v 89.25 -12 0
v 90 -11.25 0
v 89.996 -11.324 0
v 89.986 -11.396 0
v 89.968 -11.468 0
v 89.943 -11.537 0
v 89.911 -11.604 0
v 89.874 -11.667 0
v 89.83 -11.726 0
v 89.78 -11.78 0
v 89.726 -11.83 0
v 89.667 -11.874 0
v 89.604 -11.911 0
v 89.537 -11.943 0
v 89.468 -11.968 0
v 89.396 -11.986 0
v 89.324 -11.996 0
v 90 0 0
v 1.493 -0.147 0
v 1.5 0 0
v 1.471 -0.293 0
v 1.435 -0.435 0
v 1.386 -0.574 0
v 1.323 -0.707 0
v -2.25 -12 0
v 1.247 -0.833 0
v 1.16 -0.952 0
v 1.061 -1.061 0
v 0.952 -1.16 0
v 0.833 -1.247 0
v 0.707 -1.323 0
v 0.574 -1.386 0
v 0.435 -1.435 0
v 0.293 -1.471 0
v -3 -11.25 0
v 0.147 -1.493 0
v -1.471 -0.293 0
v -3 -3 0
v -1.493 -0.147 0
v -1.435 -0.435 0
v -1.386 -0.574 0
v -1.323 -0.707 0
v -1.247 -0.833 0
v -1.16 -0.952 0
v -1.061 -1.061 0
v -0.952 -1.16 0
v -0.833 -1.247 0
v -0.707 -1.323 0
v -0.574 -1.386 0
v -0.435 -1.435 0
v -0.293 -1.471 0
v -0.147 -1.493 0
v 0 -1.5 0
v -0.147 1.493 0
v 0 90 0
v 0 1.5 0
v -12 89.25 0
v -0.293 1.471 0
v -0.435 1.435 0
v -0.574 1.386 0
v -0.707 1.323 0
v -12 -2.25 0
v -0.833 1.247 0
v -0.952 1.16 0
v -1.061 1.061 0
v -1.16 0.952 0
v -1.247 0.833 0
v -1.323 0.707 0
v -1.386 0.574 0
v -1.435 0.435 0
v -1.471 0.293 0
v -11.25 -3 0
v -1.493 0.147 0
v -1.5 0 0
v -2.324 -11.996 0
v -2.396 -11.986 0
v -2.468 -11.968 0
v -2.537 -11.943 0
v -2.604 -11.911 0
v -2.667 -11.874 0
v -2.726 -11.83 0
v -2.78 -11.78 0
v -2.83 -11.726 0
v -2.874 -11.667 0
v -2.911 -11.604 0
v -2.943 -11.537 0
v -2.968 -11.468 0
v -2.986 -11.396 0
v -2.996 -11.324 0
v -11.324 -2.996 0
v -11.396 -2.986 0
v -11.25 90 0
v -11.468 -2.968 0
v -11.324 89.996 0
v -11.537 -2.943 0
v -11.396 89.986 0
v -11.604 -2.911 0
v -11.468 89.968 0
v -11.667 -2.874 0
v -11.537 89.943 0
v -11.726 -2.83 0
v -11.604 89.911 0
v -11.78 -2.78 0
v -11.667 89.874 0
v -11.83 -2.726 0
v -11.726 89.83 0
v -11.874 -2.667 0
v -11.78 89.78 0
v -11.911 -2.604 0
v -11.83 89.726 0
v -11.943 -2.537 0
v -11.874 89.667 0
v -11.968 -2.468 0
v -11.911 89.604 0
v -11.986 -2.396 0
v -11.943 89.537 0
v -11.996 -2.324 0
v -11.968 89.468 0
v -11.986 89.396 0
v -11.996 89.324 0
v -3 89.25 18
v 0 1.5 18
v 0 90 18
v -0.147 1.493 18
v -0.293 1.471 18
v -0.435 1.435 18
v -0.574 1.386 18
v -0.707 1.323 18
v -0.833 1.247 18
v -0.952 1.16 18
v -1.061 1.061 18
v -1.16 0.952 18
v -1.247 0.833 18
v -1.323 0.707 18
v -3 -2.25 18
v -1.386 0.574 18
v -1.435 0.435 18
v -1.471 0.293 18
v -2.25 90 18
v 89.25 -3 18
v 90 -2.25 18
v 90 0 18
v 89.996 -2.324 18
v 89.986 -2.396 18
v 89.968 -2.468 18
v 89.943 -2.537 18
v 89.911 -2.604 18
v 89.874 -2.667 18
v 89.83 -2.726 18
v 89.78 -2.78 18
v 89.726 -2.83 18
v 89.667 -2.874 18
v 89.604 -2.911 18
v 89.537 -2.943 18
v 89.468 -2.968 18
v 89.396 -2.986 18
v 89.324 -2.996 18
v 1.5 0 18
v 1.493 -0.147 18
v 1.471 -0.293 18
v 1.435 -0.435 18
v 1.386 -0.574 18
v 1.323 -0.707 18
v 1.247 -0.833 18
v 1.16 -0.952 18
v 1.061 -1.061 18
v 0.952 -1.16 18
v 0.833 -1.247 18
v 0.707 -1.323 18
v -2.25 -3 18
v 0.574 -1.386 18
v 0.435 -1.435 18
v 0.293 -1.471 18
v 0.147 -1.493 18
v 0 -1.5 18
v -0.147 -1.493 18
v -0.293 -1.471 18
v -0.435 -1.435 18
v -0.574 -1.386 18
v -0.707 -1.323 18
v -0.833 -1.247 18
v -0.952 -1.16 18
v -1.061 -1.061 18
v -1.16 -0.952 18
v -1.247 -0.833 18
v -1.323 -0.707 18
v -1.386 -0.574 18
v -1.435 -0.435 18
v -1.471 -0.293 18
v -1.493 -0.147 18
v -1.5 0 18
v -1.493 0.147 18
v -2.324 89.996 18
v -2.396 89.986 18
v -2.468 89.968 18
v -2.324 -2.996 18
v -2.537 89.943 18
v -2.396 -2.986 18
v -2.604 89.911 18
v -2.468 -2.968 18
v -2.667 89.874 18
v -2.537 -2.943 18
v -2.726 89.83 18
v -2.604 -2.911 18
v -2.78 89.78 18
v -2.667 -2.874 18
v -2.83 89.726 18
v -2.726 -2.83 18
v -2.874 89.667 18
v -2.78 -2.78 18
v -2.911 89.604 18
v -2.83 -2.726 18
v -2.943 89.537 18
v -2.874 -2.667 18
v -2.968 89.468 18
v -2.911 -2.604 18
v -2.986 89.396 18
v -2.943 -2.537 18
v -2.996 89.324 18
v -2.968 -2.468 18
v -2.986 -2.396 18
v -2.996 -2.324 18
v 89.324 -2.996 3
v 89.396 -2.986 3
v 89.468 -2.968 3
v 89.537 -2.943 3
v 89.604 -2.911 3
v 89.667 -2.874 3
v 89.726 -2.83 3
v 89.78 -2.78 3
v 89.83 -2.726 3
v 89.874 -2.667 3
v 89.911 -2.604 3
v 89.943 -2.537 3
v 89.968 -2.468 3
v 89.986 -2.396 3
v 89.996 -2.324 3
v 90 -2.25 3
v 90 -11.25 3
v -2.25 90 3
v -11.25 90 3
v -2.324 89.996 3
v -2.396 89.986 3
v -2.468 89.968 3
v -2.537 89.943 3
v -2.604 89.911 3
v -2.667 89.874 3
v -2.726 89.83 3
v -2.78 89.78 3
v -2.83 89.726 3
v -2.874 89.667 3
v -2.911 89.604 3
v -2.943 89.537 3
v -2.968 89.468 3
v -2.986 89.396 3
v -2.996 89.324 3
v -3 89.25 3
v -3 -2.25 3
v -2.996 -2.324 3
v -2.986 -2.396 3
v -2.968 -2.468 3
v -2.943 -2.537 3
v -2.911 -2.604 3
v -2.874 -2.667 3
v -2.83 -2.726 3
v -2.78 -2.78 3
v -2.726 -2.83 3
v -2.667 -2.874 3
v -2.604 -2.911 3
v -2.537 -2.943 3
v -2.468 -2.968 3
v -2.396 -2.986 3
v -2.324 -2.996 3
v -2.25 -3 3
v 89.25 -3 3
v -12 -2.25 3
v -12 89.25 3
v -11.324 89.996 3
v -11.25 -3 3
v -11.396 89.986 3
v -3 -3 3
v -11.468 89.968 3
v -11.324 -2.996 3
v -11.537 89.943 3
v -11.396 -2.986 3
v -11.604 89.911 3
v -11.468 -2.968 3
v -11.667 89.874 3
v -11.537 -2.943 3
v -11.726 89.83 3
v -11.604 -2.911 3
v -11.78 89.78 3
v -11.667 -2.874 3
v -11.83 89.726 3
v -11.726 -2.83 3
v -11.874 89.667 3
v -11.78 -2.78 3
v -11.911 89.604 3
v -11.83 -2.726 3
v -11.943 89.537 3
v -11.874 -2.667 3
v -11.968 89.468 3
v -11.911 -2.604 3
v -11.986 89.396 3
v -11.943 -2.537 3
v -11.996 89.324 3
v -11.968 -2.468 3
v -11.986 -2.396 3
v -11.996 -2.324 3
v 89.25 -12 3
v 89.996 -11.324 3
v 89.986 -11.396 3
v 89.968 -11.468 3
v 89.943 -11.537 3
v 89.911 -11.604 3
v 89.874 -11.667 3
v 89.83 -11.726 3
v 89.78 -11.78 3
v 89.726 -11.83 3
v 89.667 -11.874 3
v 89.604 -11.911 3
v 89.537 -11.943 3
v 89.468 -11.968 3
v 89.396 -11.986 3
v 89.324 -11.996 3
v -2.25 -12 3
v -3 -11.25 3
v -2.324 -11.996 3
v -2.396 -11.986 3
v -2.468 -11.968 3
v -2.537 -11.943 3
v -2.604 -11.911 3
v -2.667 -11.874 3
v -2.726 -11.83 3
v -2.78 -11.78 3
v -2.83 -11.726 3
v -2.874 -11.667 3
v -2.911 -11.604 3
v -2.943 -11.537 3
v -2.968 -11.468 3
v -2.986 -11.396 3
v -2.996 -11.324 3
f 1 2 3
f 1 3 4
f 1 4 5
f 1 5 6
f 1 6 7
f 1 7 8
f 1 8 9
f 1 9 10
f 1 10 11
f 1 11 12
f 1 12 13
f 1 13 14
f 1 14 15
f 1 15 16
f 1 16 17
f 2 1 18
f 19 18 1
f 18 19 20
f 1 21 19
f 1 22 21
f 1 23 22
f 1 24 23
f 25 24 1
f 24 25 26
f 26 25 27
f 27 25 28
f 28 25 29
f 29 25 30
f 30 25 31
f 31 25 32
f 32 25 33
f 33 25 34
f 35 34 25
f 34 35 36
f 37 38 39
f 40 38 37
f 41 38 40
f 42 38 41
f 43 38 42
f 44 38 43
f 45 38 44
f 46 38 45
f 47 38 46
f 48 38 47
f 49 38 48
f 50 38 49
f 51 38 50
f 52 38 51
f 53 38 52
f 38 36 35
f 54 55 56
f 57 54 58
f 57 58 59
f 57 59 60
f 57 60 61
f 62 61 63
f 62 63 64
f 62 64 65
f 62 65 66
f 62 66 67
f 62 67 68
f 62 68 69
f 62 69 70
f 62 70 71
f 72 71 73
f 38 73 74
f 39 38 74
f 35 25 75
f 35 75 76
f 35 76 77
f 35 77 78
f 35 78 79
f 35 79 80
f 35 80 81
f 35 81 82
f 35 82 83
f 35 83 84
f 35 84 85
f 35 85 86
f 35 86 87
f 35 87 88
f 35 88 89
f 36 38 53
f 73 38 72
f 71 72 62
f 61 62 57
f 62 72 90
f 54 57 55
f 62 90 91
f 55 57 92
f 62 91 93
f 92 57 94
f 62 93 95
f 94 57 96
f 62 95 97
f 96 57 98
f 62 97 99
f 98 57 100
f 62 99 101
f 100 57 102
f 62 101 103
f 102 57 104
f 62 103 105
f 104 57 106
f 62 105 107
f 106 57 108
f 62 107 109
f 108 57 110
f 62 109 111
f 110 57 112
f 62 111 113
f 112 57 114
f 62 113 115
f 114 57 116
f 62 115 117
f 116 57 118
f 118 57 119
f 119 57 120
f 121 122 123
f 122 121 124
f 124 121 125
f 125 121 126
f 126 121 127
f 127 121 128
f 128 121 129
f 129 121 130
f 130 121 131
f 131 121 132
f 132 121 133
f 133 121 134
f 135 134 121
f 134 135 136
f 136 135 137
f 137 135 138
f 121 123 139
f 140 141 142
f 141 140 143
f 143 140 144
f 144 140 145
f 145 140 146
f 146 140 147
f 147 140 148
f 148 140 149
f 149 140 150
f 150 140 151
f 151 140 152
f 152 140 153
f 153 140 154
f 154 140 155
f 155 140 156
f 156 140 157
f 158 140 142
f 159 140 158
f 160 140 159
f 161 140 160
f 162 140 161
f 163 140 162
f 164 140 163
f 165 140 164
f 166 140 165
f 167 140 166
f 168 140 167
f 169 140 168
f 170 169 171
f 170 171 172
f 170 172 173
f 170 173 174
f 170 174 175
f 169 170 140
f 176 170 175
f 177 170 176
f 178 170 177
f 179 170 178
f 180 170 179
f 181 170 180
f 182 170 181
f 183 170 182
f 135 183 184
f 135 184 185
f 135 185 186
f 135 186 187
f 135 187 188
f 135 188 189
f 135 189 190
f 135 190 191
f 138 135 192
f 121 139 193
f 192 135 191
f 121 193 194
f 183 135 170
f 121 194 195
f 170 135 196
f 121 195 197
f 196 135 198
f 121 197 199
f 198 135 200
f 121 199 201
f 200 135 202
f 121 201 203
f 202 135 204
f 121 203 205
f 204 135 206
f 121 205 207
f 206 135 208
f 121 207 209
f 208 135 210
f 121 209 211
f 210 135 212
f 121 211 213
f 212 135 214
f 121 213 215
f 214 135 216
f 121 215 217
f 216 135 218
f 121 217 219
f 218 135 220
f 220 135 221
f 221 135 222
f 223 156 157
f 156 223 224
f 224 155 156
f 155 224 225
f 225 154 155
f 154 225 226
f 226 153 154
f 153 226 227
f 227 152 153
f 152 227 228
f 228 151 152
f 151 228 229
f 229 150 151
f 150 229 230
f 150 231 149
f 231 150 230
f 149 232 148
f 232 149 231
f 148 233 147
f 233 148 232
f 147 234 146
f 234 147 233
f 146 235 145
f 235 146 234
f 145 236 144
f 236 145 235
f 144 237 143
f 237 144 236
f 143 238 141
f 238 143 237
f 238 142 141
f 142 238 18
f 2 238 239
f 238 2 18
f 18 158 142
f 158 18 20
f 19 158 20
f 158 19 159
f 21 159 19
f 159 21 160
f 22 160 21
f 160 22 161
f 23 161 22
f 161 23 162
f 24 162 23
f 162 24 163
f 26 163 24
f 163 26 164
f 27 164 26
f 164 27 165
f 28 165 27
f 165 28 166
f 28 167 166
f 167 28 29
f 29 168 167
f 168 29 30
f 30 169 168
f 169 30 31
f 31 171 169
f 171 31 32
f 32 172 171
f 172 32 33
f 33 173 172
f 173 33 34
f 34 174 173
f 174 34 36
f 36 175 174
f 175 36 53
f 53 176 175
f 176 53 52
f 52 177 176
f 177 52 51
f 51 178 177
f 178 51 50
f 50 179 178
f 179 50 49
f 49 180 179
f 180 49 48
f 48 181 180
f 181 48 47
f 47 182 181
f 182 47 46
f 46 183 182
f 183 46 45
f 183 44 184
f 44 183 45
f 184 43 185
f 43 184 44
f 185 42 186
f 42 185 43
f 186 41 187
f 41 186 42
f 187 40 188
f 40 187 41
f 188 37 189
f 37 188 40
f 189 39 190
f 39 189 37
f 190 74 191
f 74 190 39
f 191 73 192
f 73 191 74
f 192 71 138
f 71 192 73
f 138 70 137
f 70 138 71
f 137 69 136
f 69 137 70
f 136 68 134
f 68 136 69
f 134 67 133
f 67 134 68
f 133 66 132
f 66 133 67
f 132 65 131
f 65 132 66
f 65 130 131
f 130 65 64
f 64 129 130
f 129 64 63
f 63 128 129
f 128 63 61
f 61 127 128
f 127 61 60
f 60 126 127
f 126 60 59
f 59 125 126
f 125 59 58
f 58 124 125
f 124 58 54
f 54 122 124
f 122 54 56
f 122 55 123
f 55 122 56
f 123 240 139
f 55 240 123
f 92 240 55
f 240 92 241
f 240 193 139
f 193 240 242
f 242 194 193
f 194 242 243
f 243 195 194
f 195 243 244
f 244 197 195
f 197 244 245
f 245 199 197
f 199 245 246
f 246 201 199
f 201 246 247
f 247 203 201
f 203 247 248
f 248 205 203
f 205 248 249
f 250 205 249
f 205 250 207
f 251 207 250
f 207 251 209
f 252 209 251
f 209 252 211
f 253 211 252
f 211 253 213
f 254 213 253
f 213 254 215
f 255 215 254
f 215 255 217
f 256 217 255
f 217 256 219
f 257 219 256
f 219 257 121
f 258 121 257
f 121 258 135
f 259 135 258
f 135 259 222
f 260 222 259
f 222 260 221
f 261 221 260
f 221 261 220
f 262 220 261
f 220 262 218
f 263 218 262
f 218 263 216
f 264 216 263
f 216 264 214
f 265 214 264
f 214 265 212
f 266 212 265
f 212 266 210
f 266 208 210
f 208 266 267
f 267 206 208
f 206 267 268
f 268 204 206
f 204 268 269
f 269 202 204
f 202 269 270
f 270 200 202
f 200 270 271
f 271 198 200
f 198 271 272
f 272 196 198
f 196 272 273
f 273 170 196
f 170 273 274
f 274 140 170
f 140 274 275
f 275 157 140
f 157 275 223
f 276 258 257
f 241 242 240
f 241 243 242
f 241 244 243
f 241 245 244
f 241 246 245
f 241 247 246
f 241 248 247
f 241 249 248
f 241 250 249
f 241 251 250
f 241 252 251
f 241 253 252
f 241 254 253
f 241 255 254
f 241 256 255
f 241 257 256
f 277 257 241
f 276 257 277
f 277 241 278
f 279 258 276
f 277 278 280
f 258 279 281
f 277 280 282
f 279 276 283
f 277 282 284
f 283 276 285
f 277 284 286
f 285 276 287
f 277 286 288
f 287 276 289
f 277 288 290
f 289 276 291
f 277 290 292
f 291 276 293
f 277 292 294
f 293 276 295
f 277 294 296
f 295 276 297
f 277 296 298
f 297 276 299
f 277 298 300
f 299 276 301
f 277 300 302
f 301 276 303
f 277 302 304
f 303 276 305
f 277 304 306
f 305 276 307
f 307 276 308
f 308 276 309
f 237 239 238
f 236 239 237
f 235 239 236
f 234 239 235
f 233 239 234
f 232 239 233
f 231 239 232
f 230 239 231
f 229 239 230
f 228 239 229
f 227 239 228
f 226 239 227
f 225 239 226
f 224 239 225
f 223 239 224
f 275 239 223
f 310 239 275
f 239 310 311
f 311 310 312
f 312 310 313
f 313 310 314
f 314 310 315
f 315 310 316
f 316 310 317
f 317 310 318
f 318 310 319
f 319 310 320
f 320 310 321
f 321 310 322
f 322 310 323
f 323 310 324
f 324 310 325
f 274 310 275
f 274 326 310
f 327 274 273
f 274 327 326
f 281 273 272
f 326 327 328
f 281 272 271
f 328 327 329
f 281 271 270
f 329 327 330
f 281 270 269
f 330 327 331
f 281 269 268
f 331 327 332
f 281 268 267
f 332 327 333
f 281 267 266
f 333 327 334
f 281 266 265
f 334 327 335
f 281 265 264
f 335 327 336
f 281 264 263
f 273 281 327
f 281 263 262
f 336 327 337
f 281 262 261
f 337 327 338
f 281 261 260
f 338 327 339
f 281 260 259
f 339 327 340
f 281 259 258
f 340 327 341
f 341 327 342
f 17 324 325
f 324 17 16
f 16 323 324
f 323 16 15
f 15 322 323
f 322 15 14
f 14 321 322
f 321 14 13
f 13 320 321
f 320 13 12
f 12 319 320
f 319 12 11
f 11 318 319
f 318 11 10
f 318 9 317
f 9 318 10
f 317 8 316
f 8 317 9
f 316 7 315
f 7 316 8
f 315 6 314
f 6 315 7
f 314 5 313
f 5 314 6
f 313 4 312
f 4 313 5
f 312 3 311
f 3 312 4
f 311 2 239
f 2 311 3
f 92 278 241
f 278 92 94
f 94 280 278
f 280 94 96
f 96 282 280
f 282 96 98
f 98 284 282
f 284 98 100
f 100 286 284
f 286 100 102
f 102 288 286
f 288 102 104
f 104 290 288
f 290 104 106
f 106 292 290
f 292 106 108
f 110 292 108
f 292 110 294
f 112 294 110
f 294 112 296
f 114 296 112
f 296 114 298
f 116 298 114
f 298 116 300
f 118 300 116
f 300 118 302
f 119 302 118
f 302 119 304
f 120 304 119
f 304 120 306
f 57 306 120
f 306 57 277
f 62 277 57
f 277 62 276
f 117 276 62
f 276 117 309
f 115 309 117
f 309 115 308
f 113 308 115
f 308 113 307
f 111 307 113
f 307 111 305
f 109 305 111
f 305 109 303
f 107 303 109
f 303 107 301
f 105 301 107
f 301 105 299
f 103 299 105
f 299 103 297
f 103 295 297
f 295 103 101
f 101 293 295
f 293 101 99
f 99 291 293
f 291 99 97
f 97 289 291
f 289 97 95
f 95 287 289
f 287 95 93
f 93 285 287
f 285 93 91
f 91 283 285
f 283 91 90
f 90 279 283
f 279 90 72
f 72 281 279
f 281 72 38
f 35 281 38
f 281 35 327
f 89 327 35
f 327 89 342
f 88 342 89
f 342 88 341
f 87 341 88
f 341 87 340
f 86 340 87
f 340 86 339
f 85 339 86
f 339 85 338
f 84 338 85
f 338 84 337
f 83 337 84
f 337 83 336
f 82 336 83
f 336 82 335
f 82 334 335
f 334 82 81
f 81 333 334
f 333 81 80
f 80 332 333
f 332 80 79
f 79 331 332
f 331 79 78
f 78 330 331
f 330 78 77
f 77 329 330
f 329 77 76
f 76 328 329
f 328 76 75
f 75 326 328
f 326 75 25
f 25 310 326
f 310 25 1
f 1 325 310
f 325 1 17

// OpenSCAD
// Bottomless paper-stack corner jogger. All dimensions are millimeters.
// The desk is z=0; paper occupies x>=0, y>=0 and rests on the desk.
// Contact faces are y=0 and x=0 from corner_relief_radius to each length.
// Feet extend outwards only. No floor or lower-contact compensation.

contact_x_length = 90;       // Outer end of the straight y=0 registration face.
contact_y_length = 90;       // Outer end of the straight x=0 registration face.
wall_height = 18;            // Example stack envelope, not measured paper data.
wall_thickness = 3;
foot_width = 9;              // Additional outward extension beyond the wall.
foot_height = 3;
corner_relief_radius = 1.5;  // Circular clearance at the paper's inner corner.
exterior_rounding_radius = 0.75; // Only the two outside corners of each bar.

$fn = 64;

// Reject lost contact length, removed connecting material and malformed feet.
assert(contact_x_length > 0 && contact_y_length > 0,
       "Contact lengths must be positive.");
assert(wall_height > 0 && wall_thickness > 0,
       "Wall height and thickness must be positive.");
assert(foot_width > 0 && foot_height > 0 && foot_height < wall_height,
       "Feet must have positive width and height below the wall height.");
assert(corner_relief_radius > 0,
       "Corner relief radius must be positive.");
assert(exterior_rounding_radius >= 0,
       "Exterior rounding radius cannot be negative.");
assert(exterior_rounding_radius <= wall_thickness / 2,
       "Exterior rounding must leave the wall's inner contact strip intact.");
assert(corner_relief_radius + exterior_rounding_radius < wall_thickness,
       "Relief and rounding must leave a connected wall bridge.");
assert(contact_x_length > corner_relief_radius + wall_thickness &&
       contact_y_length > corner_relief_radius + wall_thickness,
       "Each arm must retain contact longer than one wall thickness.");

// Rounds the two corners facing away from the paper only. The y=0 edge
// remains straight through the full height, including its lowest layer.
module exterior_bar_2d(contact_length, depth) {
    r = exterior_rounding_radius;
    x_min = -wall_thickness;
    bar_length = contact_length - x_min;
    if (r == 0) {
        translate([x_min, -depth]) square([bar_length, depth]);
    } else {
        union() {
            translate([x_min, -depth + r])
                square([bar_length, depth - r]);
            translate([x_min + r, -depth])
                square([bar_length - 2 * r, depth]);
            translate([x_min + r, -depth + r]) circle(r = r);
            translate([contact_length - r, -depth + r]) circle(r = r);
        }
    }
}

module l_profile_2d(depth) {
    union() {
        exterior_bar_2d(contact_x_length, depth);
        // Reflection in x=y swaps the two registration axes.
        mirror([1, -1, 0]) exterior_bar_2d(contact_y_length, depth);
    }
}

// Subtract relief in 2D before extrusion; no epsilon cuts or coplanar caps.
module relieved_l_profile_2d(depth) {
    difference() {
        l_profile_2d(depth);
        circle(r = corner_relief_radius);
    }
}

union() {
    linear_extrude(height = wall_height)
        relieved_l_profile_2d(wall_thickness);
    linear_extrude(height = foot_height)
        relieved_l_profile_2d(wall_thickness + foot_width);
}
